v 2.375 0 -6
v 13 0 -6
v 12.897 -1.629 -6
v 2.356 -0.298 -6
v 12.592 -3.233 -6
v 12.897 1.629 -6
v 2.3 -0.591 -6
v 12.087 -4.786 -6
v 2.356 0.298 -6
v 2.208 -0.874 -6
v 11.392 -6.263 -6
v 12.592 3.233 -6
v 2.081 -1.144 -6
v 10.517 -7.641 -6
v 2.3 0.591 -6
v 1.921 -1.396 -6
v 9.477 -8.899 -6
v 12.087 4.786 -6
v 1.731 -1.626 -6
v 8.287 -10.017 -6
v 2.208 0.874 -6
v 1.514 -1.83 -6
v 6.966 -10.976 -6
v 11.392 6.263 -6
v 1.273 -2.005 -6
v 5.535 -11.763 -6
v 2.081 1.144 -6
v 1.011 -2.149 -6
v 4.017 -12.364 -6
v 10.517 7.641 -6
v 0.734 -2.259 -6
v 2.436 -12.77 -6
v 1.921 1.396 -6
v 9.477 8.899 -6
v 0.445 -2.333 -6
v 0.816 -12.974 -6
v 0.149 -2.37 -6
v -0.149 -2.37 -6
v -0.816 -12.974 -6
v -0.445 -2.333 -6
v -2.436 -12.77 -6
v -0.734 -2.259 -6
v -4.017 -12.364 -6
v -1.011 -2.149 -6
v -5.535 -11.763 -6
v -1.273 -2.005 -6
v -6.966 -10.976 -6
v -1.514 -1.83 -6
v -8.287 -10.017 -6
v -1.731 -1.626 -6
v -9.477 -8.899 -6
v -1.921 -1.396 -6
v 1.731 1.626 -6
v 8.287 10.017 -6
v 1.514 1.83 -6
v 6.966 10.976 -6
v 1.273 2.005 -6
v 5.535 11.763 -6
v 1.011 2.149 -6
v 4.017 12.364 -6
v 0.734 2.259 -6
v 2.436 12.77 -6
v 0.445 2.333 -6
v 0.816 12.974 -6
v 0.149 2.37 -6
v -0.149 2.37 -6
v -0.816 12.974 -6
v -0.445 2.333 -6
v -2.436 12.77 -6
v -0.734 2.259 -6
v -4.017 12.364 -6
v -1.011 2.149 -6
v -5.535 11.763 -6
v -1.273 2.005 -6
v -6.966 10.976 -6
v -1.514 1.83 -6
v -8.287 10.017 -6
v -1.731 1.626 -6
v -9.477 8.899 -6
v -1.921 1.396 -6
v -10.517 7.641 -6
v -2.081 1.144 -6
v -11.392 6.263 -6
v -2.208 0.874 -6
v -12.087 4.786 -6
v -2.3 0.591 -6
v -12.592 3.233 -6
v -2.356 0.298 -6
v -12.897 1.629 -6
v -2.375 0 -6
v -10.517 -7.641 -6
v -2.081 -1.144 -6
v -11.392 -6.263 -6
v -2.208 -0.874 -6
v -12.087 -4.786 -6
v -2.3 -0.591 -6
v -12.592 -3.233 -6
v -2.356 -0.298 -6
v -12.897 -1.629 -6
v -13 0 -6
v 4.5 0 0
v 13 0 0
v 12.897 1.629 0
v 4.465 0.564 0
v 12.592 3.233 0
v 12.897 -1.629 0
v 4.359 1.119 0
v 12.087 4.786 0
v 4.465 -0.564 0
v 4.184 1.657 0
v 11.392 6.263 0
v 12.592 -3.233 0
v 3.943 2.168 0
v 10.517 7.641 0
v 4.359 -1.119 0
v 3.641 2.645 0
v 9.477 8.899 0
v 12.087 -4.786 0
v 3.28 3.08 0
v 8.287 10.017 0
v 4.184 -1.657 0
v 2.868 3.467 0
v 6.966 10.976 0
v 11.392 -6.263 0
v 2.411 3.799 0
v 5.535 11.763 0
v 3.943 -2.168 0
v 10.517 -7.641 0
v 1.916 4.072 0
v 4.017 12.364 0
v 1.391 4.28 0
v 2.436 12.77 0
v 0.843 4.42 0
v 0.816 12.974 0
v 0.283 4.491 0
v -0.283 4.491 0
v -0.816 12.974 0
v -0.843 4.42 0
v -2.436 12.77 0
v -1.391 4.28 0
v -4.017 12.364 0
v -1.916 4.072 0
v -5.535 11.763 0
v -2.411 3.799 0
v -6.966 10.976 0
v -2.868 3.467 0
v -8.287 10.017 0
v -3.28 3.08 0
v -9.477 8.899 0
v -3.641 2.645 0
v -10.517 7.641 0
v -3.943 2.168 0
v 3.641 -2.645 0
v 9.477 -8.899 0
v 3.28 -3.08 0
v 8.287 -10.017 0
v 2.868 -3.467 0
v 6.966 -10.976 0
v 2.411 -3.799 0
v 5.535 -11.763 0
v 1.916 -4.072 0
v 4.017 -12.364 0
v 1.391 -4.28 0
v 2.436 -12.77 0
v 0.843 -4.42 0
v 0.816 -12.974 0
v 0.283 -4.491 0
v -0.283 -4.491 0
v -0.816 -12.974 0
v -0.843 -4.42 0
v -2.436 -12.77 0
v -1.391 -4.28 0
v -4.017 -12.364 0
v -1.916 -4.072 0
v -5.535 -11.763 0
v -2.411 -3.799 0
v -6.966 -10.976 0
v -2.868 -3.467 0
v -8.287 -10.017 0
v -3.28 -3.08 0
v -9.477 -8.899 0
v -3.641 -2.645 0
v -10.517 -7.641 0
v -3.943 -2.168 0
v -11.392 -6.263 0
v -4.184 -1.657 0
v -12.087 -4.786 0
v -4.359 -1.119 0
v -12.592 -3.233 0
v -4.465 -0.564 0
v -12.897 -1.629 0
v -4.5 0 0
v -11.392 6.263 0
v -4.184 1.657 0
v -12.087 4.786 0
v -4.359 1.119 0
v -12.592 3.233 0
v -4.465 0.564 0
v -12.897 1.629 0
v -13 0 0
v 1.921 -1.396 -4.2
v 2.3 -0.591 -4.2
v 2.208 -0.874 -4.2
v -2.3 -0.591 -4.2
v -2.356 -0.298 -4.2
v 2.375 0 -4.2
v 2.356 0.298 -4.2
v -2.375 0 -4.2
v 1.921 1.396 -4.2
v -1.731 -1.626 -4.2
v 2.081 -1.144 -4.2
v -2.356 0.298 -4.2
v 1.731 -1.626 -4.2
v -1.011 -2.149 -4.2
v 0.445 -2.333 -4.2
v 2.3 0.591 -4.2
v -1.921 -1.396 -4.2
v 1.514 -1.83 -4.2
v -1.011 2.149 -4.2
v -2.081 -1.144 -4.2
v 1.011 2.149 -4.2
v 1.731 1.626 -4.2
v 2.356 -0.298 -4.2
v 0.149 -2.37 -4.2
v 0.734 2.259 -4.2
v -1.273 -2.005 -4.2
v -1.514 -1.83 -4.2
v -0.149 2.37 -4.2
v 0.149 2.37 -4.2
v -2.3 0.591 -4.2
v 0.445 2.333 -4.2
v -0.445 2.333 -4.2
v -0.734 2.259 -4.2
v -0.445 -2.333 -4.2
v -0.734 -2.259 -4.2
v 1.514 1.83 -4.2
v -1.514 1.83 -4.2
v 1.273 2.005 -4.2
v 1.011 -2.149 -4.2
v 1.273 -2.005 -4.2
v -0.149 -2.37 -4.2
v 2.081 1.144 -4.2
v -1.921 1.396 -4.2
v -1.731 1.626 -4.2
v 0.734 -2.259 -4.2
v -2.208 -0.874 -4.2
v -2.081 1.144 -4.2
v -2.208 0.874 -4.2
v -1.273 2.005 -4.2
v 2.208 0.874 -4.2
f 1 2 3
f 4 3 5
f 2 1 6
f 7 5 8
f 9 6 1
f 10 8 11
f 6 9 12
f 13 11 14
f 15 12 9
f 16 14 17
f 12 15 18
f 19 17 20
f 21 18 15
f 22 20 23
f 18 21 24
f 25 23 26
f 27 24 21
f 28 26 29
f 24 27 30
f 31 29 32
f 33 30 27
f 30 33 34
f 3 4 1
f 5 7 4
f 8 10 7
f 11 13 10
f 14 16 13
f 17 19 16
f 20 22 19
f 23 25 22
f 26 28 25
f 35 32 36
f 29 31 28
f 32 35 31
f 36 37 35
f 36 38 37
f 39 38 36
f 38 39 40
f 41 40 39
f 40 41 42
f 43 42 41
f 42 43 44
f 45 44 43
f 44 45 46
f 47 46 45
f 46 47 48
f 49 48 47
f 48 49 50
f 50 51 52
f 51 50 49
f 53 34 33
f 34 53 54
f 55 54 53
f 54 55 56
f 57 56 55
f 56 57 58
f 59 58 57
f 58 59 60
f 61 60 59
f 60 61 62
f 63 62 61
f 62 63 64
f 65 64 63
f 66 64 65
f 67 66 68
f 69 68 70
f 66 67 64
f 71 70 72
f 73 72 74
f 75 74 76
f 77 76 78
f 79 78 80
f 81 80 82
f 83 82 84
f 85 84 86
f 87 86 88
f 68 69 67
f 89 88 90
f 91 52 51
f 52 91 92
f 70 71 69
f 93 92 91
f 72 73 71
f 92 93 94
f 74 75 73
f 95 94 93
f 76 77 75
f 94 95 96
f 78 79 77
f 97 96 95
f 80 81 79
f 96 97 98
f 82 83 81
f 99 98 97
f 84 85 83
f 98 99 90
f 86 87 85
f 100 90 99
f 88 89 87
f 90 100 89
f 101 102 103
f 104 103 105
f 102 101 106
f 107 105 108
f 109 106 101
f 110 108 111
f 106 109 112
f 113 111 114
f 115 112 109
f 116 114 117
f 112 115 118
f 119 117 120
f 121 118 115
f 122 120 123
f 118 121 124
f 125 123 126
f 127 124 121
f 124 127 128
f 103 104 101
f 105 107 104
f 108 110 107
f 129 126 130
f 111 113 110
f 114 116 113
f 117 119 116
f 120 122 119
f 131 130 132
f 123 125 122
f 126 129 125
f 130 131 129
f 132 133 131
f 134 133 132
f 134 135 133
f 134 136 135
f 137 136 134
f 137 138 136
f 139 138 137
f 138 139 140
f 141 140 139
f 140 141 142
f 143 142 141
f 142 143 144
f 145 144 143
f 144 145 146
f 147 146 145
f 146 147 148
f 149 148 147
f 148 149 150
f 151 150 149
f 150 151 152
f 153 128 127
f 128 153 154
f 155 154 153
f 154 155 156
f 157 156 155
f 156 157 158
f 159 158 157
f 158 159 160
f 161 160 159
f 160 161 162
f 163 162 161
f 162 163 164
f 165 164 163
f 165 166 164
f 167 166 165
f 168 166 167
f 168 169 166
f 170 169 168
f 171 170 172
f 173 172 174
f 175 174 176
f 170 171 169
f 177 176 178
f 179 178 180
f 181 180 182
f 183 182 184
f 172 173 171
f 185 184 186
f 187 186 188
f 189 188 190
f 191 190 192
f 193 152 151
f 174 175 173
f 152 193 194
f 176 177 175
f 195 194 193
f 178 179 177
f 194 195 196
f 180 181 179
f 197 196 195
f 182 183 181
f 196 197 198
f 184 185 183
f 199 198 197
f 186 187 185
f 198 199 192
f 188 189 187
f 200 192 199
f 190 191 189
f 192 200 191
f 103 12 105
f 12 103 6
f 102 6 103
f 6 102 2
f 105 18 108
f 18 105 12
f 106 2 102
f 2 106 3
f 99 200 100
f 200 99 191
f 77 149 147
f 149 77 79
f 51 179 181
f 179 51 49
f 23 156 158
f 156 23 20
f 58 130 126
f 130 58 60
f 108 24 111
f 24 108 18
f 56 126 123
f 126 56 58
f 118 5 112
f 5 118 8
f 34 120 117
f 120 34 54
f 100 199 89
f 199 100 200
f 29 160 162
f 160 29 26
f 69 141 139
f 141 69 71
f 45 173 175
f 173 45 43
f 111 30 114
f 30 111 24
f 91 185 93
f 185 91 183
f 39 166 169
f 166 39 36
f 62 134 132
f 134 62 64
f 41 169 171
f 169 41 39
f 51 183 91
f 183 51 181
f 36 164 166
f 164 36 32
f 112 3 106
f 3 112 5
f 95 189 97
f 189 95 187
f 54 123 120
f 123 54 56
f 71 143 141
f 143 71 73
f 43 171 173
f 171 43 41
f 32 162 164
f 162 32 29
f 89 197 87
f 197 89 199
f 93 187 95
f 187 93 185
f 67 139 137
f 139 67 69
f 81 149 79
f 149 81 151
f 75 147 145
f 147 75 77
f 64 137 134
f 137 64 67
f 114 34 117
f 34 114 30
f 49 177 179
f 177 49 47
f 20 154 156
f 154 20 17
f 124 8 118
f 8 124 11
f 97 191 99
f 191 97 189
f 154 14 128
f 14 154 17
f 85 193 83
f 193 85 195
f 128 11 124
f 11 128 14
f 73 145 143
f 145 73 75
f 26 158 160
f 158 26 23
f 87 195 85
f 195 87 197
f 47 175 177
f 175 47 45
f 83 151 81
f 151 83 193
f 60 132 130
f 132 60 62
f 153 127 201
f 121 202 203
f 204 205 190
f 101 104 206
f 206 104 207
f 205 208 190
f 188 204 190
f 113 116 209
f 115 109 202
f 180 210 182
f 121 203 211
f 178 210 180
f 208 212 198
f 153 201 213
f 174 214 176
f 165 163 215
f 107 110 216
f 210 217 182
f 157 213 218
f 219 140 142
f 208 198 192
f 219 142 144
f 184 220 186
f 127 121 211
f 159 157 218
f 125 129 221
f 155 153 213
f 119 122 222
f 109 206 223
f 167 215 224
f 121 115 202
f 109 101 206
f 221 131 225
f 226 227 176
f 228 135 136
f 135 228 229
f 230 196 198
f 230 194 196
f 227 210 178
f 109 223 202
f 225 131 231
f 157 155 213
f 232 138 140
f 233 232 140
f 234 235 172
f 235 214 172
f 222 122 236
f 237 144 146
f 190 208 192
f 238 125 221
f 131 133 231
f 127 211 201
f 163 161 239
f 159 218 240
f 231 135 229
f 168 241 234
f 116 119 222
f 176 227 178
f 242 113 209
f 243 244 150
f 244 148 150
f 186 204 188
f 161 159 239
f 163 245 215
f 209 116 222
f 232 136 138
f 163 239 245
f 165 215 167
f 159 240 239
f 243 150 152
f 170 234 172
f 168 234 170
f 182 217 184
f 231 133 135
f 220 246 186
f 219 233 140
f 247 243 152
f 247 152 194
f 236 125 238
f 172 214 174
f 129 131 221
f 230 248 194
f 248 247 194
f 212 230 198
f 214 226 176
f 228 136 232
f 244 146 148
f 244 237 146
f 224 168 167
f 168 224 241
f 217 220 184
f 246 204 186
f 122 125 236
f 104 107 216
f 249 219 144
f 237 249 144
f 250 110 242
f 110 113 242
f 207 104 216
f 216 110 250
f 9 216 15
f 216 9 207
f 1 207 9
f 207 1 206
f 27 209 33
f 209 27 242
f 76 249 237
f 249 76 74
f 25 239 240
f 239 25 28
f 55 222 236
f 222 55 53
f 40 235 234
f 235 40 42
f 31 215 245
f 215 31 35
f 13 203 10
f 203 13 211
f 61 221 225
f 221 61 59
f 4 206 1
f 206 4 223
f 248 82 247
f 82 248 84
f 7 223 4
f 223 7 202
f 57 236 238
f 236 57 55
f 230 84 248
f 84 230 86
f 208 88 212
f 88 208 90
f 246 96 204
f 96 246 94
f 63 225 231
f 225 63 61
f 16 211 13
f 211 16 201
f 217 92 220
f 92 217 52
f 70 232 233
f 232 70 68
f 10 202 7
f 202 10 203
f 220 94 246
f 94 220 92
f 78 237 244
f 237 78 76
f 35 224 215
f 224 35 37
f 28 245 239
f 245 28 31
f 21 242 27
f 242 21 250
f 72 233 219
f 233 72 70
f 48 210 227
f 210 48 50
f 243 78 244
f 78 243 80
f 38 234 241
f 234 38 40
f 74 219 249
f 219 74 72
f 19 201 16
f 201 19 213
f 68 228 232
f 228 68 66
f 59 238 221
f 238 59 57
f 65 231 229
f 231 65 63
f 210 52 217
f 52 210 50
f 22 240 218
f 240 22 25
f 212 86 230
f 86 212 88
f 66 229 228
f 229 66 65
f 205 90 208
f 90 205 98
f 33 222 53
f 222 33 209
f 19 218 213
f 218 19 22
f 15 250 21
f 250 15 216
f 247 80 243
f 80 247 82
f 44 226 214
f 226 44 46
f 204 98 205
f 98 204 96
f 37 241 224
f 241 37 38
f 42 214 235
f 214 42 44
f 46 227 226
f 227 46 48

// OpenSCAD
$fn = 50;


difference() {
	union() {
		translate(v = [0, 0, -6.0000000000]) {
			cylinder(h = 6, r = 7.0000000000);
		}
		translate(v = [0, 0, -6.0000000000]) {
			cylinder(h = 6, r = 13.0000000000);
		}
	}
	union() {
		translate(v = [0, 0, 0]) {
			rotate(a = [0, 0, 0]) {
				difference() {
					union() {
						#translate(v = [0, 0, -6.0000000000]) {
							cylinder(h = 6, r = 2.2500000000);
						}
						#translate(v = [0, 0, -4.2000000000]) {
							cylinder(h = 4.2000000000, r1 = 2.3750000000, r2 = 4.5000000000);
						}
						#translate(v = [0, 0, -6.0000000000]) {
							cylinder(h = 6, r = 2.3750000000);
						}
						#translate(v = [0, 0, -6.0000000000]) {
							cylinder(h = 6, r = 2.2500000000);
						}
					}
					union();
				}
			}
		}
	}
}
